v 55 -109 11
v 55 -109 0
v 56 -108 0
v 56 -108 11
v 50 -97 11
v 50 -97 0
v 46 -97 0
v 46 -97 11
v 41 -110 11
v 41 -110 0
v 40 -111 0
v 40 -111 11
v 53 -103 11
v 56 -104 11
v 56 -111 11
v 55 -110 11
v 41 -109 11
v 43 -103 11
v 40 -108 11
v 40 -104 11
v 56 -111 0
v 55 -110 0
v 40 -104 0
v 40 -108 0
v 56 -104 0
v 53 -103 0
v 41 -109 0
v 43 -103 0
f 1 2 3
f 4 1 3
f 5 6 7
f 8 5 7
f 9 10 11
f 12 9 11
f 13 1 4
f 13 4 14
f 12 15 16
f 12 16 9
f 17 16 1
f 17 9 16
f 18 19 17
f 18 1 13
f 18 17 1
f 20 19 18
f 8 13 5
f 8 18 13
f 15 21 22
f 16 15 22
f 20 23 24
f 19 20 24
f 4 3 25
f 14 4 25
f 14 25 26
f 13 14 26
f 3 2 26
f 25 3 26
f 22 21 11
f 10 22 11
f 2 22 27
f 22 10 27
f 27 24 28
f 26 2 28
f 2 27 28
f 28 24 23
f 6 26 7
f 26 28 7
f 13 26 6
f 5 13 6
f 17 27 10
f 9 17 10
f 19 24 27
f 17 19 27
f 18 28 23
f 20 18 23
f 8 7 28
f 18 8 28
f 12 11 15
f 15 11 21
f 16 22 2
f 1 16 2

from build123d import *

# Parameters (mm, degrees)
EXTRUDE_DEPTH = 11


with BuildPart() as part:
    # path2076 → Extrude (new body)
    with BuildSketch(Plane(origin=(47.999999, -104, 0), x_dir=(0, 1, 0), z_dir=(0, 0, 1))):
        with BuildLine():
            add(Edge.make_bspline(
                [(-7, -8), (-6, -7)],
                knots=[0, 0, 1.414214, 1.414214], degree=1))
            add(Edge.make_bspline(
                [(-6, -7), (-5, -7)],
                knots=[0, 0, 1, 1], degree=1))
            add(Edge.make_bspline(
                [(-5, -7), (-4, -7.999998)],
                knots=[0, 0, 1.414212, 1.414212], degree=1))
            add(Edge.make_bspline(
                [(-4, -7.999998), (0, -8)],
                knots=[0, 0, 4, 4], degree=1))
            add(Edge.make_bspline(
                [(0, -8), (1, -5)],
                knots=[0, 0, 3.162278, 3.162278], degree=1))
            add(Edge.make_bspline(
                [(1, -5), (7, -2)],
                knots=[0, 0, 6.708204, 6.708204], degree=1))
            add(Edge.make_bspline(
                [(7, -2), (7, 2)],
                knots=[0, 0, 4, 4], degree=1))
            add(Edge.make_bspline(
                [(7, 2), (1, 5)],
                knots=[0, 0, 6.708204, 6.708204], degree=1))
            add(Edge.make_bspline(
                [(1, 5), (0, 8)],
                knots=[0, 0, 3.162278, 3.162278], degree=1))
            add(Edge.make_bspline(
                [(0, 8), (-4, 8)],
                knots=[0, 0, 4, 4], degree=1))
            add(Edge.make_bspline(
                [(-4, 8), (-5, 7)],
                knots=[0, 0, 1.414214, 1.414214], degree=1))
            add(Edge.make_bspline(
                [(-5, 7), (-6, 7)],
                knots=[0, 0, 1, 1], degree=1))
            add(Edge.make_bspline(
                [(-6, 7), (-7, 8)],
                knots=[0, 0, 1.414214, 1.414214], degree=1))
            add(Edge.make_bspline(
                [(-7, 8), (-7, -8)],
                knots=[0, 0, 16, 16], degree=1))
        make_face()
    extrude(amount=EXTRUDE_DEPTH)


solid = part.part
